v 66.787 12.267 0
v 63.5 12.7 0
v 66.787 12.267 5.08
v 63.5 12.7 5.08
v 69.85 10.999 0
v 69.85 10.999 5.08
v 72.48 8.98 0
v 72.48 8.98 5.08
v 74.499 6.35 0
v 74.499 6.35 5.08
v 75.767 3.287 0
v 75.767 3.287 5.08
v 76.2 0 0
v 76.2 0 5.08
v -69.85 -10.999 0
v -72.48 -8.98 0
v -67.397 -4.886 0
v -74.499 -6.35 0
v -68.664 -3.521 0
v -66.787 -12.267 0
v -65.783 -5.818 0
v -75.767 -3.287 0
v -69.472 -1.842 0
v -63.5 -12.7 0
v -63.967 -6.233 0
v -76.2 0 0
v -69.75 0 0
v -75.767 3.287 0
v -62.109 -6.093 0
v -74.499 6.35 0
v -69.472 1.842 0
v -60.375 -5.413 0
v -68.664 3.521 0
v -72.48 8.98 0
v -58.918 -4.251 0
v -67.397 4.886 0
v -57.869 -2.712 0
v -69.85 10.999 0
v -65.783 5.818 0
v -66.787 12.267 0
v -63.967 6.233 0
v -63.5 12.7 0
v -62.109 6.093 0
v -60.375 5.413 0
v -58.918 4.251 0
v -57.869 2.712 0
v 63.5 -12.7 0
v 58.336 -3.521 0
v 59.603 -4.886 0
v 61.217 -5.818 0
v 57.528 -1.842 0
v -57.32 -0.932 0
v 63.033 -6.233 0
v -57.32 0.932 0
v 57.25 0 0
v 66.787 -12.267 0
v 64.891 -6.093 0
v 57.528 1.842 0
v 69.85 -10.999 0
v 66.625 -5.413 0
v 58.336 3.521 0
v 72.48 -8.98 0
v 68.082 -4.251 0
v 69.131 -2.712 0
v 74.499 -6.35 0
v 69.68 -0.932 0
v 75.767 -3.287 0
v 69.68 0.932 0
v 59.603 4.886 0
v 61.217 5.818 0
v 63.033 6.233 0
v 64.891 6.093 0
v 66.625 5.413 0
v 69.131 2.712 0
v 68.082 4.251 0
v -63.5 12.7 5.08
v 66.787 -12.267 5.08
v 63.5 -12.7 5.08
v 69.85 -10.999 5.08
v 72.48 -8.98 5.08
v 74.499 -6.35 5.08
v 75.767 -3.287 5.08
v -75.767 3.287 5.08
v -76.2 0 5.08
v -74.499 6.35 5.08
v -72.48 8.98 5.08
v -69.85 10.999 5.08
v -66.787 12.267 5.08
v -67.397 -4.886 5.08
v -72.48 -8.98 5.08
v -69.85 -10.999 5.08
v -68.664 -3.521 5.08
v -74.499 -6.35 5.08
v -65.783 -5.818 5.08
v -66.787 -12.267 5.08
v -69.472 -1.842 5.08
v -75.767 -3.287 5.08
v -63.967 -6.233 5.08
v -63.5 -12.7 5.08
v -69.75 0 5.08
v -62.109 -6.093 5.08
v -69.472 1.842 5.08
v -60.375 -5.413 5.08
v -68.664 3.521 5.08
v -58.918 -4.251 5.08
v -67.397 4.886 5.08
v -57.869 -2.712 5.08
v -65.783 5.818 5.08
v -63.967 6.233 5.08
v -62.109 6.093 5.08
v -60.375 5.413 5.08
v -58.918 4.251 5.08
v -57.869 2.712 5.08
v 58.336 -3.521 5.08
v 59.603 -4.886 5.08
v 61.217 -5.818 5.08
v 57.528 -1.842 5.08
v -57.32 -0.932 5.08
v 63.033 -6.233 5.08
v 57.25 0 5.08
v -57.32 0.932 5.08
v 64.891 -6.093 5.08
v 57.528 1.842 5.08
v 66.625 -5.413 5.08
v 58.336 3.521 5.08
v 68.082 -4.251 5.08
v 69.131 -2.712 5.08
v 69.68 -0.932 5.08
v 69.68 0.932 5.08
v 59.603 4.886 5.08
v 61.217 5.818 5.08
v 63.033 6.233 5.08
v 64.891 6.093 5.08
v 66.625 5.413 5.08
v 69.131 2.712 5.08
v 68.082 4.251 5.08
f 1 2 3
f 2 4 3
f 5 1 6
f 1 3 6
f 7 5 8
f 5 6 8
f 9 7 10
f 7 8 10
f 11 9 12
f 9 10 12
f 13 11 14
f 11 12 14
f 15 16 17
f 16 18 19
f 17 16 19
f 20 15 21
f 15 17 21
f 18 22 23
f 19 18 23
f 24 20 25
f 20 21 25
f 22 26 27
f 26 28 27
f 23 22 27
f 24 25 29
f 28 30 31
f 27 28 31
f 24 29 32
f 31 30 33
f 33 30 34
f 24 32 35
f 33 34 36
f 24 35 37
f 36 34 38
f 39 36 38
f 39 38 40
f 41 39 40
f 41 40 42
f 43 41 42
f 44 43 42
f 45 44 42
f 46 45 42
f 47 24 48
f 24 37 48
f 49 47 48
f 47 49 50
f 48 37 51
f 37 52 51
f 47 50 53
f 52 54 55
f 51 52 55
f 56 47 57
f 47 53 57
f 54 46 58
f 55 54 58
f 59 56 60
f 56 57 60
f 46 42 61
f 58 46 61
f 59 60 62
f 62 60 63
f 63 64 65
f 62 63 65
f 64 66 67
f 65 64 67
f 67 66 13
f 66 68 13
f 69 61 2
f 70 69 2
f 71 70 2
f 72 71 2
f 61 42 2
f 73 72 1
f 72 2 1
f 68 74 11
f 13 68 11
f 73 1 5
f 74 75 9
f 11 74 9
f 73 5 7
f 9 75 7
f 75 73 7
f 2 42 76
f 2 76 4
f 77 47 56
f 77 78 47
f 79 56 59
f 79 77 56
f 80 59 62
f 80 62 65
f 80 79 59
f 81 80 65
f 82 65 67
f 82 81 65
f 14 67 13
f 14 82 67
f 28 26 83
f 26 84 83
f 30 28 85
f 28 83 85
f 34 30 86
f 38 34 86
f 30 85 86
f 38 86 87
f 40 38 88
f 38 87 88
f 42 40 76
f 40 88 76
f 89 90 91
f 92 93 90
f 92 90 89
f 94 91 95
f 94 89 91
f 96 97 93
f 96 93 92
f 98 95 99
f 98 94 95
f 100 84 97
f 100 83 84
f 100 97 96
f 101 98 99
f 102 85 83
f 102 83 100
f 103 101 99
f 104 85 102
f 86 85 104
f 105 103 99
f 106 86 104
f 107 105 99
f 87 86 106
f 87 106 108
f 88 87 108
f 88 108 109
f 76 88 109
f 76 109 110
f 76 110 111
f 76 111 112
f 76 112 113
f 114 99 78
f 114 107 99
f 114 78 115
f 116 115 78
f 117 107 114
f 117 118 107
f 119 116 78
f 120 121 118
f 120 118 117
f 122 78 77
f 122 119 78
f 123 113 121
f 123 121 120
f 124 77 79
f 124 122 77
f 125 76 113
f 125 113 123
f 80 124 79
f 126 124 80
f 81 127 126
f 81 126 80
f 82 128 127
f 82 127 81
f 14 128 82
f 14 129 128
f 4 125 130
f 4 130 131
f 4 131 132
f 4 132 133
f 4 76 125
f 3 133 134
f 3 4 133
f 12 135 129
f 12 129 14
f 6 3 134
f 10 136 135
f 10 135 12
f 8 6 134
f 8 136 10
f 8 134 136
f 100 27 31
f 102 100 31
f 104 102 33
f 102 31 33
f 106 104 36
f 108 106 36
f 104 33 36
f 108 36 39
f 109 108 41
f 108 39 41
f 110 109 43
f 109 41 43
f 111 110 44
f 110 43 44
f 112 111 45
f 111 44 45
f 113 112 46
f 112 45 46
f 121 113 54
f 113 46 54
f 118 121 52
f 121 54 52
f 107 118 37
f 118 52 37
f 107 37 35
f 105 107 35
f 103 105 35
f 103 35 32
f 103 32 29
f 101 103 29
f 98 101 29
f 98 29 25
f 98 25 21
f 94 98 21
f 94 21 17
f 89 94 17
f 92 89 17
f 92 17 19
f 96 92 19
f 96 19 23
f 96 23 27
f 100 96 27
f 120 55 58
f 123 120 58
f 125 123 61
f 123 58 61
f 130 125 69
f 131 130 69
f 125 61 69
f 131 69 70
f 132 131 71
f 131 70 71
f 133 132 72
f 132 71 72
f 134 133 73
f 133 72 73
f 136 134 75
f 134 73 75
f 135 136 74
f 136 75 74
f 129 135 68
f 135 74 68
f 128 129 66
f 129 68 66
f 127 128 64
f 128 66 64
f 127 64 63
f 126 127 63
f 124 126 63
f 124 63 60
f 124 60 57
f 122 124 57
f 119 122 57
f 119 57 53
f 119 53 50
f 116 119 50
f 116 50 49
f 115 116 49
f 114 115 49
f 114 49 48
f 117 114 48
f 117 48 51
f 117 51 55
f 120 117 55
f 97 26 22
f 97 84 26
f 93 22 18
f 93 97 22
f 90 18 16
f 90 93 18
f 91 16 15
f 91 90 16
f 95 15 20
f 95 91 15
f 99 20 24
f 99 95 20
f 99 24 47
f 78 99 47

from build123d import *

# Parameters (mm, degrees)
SKETCH1_W                    = 152.4
SKETCH1_H                    = 25.4
BOSS_EXTRUDE1_DEPTH          = 5.08
F_12_5_12_5_DIAMETER_HOLE1_D = 12.5
FILLET3_R                    = 12.7


with BuildPart() as part:
    # Sketch1 → Boss-Extrude1 (new body)
    with BuildSketch(Plane.XY):
        Rectangle(SKETCH1_W, SKETCH1_H)
    extrude(amount=BOSS_EXTRUDE1_DEPTH)

    # Ø12.5 (12.5) Diameter Hole1 (through all)
    with Locations(Plane.XY.offset(5.08)):
        with Locations((-63.5, 0), (63.5, 0)):
            Hole(F_12_5_12_5_DIAMETER_HOLE1_D / 2)

    # Fillet3
    fillet3_edges = [part.edges().sort_by_distance(p)[0] for p in [
        (-76.2, 12.7, 2.54),
        (-76.2, -12.7, 2.54),
        (76.2, -12.7, 2.54),
        (76.2, 12.7, 2.54),
    ]]
    fillet(fillet3_edges, radius=FILLET3_R - 0.0001)  # a hair under: the kernel refuses the full size


solid = part.part
